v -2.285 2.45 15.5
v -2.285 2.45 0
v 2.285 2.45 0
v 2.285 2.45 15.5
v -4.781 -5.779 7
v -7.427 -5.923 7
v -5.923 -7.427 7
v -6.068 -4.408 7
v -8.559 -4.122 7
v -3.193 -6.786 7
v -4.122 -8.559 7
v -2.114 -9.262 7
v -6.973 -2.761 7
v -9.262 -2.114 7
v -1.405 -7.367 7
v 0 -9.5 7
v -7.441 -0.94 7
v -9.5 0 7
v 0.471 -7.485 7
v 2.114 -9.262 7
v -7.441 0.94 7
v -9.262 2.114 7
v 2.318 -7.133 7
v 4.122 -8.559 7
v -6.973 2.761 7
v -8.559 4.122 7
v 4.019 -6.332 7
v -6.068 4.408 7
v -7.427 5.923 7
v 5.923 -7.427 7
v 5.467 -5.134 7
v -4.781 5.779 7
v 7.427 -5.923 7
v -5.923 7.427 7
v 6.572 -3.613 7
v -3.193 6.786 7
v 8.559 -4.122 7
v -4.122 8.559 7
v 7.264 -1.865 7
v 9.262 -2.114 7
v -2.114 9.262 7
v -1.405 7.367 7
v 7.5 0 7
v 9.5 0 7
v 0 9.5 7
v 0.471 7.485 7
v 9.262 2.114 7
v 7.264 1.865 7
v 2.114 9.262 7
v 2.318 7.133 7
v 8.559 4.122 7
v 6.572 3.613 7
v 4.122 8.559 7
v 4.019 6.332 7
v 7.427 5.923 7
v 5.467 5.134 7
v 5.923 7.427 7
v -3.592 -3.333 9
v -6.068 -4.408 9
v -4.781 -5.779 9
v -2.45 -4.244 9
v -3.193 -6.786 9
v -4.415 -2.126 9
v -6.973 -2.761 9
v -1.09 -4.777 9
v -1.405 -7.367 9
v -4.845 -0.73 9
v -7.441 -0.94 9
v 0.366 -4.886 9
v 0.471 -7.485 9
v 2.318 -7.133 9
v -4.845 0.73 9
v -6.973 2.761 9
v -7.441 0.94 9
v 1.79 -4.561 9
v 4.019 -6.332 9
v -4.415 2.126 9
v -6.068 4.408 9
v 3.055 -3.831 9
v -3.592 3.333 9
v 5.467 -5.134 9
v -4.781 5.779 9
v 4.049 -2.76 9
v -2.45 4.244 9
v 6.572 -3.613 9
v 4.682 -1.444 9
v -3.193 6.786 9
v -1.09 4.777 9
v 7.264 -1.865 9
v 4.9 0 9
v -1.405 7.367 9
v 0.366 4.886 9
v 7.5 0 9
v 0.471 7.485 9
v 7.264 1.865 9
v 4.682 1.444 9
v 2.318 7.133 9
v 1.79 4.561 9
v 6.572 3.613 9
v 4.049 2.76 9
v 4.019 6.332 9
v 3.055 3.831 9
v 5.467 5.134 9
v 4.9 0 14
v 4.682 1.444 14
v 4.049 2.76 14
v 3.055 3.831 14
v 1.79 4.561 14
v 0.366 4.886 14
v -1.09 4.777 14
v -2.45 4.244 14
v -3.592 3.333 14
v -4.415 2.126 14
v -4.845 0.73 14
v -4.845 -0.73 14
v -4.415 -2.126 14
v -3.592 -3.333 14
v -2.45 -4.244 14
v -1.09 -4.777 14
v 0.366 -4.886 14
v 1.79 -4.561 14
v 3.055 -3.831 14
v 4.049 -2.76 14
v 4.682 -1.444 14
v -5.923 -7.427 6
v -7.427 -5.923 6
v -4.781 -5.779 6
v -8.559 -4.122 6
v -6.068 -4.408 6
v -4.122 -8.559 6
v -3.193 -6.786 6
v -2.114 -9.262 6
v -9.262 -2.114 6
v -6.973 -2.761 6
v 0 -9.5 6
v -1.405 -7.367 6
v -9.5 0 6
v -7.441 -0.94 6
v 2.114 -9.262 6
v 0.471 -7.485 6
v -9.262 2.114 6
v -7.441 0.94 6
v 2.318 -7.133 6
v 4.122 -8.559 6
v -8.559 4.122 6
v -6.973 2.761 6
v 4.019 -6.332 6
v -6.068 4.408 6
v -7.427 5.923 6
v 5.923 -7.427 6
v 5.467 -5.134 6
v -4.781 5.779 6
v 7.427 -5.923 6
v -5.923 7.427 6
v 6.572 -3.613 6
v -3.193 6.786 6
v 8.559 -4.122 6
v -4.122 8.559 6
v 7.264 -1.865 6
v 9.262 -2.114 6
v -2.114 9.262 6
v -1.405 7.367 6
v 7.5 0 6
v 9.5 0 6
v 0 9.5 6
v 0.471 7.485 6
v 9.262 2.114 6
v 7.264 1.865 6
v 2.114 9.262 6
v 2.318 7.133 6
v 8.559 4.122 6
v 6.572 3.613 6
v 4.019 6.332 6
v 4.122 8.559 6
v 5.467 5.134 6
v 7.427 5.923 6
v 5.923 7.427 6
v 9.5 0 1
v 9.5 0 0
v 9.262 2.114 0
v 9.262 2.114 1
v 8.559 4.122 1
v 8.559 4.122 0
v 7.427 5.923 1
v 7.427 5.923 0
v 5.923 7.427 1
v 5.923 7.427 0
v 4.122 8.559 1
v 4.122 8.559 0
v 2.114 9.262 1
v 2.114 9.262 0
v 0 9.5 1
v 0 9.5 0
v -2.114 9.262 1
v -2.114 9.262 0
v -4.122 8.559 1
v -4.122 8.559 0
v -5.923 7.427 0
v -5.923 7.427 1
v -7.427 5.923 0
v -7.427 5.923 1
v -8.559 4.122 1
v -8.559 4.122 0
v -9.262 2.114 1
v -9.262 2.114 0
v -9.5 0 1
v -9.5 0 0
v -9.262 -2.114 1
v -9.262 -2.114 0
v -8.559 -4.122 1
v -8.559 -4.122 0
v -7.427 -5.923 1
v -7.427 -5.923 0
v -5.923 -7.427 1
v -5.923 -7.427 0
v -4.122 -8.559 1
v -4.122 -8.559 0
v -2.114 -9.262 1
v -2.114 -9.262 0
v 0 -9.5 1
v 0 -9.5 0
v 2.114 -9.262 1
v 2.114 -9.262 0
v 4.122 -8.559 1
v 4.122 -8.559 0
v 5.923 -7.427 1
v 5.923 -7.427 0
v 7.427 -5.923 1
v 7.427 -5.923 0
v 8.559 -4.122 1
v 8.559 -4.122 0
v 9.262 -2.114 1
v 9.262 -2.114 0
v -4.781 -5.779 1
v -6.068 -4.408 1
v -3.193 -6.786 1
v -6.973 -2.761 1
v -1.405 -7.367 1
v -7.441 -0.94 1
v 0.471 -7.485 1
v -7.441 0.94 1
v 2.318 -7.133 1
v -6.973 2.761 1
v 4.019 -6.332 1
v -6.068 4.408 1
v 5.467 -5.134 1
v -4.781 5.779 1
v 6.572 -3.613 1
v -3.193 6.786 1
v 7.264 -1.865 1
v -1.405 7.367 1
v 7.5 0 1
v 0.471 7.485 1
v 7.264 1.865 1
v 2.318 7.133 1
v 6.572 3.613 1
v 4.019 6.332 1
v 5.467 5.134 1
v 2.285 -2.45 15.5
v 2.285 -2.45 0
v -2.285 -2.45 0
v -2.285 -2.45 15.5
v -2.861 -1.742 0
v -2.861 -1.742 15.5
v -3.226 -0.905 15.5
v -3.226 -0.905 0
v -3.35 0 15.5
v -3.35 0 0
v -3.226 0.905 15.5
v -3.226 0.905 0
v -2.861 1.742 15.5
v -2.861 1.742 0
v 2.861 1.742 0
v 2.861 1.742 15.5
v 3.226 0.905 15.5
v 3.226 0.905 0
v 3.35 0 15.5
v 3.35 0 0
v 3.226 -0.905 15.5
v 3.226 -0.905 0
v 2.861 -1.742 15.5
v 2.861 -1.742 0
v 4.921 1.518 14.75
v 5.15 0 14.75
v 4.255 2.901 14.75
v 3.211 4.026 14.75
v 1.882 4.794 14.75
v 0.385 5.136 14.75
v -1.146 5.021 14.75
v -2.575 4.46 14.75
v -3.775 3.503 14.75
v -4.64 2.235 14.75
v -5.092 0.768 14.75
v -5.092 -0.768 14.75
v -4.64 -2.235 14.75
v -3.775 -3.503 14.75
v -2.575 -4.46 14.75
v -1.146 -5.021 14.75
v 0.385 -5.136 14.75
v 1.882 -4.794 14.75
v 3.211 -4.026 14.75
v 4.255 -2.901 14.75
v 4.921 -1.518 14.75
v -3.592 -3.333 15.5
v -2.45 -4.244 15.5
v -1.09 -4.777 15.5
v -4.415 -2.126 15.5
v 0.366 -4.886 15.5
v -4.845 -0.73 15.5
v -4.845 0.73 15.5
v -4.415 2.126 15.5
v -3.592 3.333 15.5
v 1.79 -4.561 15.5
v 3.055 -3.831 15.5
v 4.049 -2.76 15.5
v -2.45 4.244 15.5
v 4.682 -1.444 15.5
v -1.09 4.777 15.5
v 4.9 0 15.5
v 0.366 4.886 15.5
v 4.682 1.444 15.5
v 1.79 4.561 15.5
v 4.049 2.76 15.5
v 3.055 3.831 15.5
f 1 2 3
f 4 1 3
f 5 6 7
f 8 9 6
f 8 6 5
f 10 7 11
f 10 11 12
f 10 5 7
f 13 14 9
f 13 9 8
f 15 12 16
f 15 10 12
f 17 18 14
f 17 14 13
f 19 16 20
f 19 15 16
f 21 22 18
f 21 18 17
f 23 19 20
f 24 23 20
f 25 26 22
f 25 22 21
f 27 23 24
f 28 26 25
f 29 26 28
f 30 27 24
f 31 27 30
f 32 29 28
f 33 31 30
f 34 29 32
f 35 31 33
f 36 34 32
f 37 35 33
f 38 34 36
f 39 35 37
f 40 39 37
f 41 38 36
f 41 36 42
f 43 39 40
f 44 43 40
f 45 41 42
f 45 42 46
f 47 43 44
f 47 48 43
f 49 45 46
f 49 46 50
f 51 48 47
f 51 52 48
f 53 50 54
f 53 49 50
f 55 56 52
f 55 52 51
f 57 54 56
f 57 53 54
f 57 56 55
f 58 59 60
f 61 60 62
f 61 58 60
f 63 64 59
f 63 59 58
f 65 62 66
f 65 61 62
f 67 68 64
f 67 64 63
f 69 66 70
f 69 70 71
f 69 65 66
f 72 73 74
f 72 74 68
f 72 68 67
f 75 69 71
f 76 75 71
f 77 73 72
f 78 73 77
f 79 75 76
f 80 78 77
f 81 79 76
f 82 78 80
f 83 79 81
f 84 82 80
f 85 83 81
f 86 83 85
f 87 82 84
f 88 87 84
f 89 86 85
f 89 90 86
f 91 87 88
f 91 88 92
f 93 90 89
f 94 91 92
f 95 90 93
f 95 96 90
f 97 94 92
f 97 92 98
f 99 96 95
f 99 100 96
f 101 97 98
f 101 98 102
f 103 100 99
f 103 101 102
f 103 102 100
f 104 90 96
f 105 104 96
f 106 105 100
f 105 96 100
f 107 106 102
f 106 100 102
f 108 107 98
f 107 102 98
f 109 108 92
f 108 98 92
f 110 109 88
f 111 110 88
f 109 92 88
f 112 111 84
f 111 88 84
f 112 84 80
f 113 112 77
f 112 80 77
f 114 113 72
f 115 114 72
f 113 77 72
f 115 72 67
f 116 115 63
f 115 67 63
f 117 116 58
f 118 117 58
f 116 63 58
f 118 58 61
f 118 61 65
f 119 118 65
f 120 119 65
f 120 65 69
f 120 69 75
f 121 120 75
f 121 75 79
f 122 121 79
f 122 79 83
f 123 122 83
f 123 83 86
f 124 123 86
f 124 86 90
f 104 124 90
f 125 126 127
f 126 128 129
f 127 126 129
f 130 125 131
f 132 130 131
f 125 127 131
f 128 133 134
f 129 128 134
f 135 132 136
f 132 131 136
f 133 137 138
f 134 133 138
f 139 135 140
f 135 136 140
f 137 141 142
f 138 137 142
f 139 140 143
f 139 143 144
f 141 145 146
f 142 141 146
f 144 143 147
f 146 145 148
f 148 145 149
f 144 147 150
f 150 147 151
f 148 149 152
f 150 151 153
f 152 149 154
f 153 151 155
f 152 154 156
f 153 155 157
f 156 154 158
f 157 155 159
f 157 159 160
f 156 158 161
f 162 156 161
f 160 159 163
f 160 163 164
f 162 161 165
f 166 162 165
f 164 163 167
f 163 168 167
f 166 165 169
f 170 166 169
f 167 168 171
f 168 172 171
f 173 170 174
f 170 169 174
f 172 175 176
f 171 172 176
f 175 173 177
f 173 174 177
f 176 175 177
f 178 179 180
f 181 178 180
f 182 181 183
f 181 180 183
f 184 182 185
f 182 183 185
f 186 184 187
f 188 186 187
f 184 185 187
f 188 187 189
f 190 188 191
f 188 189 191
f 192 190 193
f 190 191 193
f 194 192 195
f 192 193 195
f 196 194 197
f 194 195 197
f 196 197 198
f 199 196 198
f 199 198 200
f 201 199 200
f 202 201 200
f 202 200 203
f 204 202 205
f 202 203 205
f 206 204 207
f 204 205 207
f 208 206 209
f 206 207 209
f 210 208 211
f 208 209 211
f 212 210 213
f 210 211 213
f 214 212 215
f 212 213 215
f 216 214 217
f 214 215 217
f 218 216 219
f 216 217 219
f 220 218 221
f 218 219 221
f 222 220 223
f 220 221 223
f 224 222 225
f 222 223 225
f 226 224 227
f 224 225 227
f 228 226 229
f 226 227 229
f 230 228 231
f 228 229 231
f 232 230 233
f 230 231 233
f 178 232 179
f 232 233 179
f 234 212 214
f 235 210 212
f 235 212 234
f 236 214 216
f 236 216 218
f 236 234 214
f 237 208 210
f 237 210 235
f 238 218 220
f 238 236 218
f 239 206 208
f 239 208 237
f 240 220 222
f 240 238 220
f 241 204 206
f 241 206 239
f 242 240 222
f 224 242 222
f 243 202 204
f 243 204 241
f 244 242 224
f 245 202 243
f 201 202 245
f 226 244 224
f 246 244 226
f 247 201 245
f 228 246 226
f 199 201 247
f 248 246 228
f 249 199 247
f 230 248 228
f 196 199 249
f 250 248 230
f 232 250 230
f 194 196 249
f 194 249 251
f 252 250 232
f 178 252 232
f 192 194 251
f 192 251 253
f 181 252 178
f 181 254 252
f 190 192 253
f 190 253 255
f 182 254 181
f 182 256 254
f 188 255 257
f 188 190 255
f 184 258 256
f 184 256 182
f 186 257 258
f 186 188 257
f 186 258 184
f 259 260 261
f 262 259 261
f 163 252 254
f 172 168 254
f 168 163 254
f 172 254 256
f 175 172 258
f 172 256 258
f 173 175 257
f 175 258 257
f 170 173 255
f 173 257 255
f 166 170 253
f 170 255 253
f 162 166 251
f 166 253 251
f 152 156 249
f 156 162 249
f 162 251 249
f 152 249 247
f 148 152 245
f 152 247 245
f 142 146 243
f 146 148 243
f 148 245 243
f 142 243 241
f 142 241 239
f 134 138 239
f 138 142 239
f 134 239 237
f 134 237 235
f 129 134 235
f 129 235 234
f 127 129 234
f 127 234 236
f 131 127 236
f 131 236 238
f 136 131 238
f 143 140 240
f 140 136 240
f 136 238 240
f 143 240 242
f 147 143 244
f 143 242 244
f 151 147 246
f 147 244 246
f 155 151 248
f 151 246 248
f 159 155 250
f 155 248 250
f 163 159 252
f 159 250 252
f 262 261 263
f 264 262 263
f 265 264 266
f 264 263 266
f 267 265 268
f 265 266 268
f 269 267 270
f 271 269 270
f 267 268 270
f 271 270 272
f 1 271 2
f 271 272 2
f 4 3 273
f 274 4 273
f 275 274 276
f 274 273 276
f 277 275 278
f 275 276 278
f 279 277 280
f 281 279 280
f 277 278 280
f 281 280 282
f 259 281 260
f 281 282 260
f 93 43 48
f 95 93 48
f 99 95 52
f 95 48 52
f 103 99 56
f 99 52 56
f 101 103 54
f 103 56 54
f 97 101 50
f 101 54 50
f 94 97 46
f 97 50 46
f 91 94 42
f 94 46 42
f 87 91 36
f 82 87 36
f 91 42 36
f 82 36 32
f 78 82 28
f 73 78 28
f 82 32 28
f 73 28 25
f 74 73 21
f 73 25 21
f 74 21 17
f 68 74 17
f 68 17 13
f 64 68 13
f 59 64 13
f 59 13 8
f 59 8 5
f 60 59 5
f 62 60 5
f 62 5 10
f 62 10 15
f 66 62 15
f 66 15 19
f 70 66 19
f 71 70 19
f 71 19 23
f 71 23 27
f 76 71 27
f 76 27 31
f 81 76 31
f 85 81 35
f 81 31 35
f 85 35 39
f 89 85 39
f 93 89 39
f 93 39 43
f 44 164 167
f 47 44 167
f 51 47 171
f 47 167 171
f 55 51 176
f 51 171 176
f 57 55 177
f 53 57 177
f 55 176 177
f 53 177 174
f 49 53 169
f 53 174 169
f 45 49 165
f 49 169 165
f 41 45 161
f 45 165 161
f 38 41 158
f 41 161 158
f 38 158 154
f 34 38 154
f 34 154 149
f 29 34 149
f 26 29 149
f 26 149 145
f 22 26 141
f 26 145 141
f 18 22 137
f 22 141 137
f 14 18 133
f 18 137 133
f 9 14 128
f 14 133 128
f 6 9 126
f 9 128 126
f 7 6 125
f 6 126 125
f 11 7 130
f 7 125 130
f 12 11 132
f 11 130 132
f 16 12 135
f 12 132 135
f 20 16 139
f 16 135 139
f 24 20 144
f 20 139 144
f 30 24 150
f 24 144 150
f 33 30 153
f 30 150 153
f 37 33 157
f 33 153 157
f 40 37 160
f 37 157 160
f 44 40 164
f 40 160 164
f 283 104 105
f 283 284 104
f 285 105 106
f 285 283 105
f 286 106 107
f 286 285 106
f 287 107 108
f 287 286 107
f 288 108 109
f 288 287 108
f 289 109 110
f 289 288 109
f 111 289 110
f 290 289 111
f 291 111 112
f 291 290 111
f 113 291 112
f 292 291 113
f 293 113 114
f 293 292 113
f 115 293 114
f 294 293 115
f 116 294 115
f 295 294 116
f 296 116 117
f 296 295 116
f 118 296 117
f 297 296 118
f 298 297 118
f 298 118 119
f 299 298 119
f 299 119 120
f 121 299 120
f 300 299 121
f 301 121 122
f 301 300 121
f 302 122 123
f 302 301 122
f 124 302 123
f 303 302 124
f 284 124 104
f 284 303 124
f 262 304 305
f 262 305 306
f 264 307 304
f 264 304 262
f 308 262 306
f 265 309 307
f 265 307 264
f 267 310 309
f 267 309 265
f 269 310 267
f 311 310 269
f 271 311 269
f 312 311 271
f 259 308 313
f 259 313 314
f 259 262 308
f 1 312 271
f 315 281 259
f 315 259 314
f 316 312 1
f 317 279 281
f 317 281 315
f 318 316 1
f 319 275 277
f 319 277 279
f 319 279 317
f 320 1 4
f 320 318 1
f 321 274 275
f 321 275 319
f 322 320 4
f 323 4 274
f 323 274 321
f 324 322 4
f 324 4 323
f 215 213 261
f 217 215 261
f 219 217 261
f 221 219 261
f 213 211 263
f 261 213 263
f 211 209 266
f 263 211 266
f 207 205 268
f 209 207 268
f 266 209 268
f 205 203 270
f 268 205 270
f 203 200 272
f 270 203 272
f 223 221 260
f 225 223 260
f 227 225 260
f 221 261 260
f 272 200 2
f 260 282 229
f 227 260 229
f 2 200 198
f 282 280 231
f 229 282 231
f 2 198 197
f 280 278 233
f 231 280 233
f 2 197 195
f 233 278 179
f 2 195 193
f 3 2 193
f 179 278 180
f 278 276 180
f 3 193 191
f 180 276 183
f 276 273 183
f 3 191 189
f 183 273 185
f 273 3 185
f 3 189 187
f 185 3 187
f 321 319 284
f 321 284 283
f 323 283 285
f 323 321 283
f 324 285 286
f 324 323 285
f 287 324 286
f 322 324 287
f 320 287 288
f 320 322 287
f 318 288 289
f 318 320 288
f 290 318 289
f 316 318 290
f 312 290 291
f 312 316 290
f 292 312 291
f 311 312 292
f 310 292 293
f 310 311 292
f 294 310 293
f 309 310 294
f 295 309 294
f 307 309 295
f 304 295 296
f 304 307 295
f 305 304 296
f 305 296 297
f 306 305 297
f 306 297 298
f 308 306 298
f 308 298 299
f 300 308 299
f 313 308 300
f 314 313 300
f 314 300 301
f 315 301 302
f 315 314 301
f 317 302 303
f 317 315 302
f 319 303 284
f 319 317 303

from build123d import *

# Parameters (mm, degrees)
F3_R     = 9.5
F3_R_2   = 7.5
F3_R_3   = 4.9
F4_DEPTH = 1
F6_DEPTH = 9
F7_DEPTH = 15.5


with BuildPart() as f4:
    # F3 (on Top) → F4 (new body)
    with BuildSketch(Plane.XY):
        Circle(F3_R)
        Circle(F3_R_2, mode=Mode.SUBTRACT)
        Circle(F3_R_2)
        Circle(F3_R_3, mode=Mode.SUBTRACT)
        Circle(F3_R_3)
        with BuildLine():
            ThreePointArc((-2.2847319318, -2.45), (-3.35, 0), (-2.2847319318, 2.45))
            Line((-2.2847319318, 2.45), (2.2847319318, 2.45))
            ThreePointArc((2.2847319318, 2.45), (3.35, 0), (2.2847319318, -2.45))
            Line((2.2847319318, -2.45), (-2.2847319318, -2.45))
        make_face(mode=Mode.SUBTRACT)
    extrude(amount=F4_DEPTH)


with BuildPart() as f5_1:
    # F5: copy of F4
    add(f4.part.moved(Location((0, 0, 6))))


with BuildPart() as f6:
    # F3 (on Top) → F6 (new body)
    with BuildSketch(Plane.XY):
        Circle(F3_R_2)
        Circle(F3_R_3, mode=Mode.SUBTRACT)
        Circle(F3_R_3)
        with BuildLine():
            ThreePointArc((-2.2847319318, -2.45), (-3.35, 0), (-2.2847319318, 2.45))
            Line((-2.2847319318, 2.45), (2.2847319318, 2.45))
            ThreePointArc((2.2847319318, 2.45), (3.35, 0), (2.2847319318, -2.45))
            Line((2.2847319318, -2.45), (-2.2847319318, -2.45))
        make_face(mode=Mode.SUBTRACT)
    extrude(amount=F6_DEPTH)


with BuildPart() as f4_1:
    add(f4.part)

    add(f5_1.part)  # F7 merges F5_1

    add(f6.part)  # F7 merges F6
    # F3 (on Top) → F7 (join)
    with BuildSketch(Plane.XY):
        Circle(F3_R_3)
        with BuildLine():
            ThreePointArc((-2.2847319318, -2.45), (-3.35, 0), (-2.2847319318, 2.45))
            Line((-2.2847319318, 2.45), (2.2847319318, 2.45))
            ThreePointArc((2.2847319318, 2.45), (3.35, 0), (2.2847319318, -2.45))
            Line((2.2847319318, -2.45), (-2.2847319318, -2.45))
        make_face(mode=Mode.SUBTRACT)
    extrude(amount=F7_DEPTH)

    # F8 (on Front) → F9 (revolve)
    with BuildSketch(Plane.XZ):
        Polygon((5.15, 14.75), (4.9, 15.5), (4.9, 14), align=None)
    revolve(axis=Axis((0, 0, 8.7542282417), (0, 0, 1)))


solid = f4_1.part
